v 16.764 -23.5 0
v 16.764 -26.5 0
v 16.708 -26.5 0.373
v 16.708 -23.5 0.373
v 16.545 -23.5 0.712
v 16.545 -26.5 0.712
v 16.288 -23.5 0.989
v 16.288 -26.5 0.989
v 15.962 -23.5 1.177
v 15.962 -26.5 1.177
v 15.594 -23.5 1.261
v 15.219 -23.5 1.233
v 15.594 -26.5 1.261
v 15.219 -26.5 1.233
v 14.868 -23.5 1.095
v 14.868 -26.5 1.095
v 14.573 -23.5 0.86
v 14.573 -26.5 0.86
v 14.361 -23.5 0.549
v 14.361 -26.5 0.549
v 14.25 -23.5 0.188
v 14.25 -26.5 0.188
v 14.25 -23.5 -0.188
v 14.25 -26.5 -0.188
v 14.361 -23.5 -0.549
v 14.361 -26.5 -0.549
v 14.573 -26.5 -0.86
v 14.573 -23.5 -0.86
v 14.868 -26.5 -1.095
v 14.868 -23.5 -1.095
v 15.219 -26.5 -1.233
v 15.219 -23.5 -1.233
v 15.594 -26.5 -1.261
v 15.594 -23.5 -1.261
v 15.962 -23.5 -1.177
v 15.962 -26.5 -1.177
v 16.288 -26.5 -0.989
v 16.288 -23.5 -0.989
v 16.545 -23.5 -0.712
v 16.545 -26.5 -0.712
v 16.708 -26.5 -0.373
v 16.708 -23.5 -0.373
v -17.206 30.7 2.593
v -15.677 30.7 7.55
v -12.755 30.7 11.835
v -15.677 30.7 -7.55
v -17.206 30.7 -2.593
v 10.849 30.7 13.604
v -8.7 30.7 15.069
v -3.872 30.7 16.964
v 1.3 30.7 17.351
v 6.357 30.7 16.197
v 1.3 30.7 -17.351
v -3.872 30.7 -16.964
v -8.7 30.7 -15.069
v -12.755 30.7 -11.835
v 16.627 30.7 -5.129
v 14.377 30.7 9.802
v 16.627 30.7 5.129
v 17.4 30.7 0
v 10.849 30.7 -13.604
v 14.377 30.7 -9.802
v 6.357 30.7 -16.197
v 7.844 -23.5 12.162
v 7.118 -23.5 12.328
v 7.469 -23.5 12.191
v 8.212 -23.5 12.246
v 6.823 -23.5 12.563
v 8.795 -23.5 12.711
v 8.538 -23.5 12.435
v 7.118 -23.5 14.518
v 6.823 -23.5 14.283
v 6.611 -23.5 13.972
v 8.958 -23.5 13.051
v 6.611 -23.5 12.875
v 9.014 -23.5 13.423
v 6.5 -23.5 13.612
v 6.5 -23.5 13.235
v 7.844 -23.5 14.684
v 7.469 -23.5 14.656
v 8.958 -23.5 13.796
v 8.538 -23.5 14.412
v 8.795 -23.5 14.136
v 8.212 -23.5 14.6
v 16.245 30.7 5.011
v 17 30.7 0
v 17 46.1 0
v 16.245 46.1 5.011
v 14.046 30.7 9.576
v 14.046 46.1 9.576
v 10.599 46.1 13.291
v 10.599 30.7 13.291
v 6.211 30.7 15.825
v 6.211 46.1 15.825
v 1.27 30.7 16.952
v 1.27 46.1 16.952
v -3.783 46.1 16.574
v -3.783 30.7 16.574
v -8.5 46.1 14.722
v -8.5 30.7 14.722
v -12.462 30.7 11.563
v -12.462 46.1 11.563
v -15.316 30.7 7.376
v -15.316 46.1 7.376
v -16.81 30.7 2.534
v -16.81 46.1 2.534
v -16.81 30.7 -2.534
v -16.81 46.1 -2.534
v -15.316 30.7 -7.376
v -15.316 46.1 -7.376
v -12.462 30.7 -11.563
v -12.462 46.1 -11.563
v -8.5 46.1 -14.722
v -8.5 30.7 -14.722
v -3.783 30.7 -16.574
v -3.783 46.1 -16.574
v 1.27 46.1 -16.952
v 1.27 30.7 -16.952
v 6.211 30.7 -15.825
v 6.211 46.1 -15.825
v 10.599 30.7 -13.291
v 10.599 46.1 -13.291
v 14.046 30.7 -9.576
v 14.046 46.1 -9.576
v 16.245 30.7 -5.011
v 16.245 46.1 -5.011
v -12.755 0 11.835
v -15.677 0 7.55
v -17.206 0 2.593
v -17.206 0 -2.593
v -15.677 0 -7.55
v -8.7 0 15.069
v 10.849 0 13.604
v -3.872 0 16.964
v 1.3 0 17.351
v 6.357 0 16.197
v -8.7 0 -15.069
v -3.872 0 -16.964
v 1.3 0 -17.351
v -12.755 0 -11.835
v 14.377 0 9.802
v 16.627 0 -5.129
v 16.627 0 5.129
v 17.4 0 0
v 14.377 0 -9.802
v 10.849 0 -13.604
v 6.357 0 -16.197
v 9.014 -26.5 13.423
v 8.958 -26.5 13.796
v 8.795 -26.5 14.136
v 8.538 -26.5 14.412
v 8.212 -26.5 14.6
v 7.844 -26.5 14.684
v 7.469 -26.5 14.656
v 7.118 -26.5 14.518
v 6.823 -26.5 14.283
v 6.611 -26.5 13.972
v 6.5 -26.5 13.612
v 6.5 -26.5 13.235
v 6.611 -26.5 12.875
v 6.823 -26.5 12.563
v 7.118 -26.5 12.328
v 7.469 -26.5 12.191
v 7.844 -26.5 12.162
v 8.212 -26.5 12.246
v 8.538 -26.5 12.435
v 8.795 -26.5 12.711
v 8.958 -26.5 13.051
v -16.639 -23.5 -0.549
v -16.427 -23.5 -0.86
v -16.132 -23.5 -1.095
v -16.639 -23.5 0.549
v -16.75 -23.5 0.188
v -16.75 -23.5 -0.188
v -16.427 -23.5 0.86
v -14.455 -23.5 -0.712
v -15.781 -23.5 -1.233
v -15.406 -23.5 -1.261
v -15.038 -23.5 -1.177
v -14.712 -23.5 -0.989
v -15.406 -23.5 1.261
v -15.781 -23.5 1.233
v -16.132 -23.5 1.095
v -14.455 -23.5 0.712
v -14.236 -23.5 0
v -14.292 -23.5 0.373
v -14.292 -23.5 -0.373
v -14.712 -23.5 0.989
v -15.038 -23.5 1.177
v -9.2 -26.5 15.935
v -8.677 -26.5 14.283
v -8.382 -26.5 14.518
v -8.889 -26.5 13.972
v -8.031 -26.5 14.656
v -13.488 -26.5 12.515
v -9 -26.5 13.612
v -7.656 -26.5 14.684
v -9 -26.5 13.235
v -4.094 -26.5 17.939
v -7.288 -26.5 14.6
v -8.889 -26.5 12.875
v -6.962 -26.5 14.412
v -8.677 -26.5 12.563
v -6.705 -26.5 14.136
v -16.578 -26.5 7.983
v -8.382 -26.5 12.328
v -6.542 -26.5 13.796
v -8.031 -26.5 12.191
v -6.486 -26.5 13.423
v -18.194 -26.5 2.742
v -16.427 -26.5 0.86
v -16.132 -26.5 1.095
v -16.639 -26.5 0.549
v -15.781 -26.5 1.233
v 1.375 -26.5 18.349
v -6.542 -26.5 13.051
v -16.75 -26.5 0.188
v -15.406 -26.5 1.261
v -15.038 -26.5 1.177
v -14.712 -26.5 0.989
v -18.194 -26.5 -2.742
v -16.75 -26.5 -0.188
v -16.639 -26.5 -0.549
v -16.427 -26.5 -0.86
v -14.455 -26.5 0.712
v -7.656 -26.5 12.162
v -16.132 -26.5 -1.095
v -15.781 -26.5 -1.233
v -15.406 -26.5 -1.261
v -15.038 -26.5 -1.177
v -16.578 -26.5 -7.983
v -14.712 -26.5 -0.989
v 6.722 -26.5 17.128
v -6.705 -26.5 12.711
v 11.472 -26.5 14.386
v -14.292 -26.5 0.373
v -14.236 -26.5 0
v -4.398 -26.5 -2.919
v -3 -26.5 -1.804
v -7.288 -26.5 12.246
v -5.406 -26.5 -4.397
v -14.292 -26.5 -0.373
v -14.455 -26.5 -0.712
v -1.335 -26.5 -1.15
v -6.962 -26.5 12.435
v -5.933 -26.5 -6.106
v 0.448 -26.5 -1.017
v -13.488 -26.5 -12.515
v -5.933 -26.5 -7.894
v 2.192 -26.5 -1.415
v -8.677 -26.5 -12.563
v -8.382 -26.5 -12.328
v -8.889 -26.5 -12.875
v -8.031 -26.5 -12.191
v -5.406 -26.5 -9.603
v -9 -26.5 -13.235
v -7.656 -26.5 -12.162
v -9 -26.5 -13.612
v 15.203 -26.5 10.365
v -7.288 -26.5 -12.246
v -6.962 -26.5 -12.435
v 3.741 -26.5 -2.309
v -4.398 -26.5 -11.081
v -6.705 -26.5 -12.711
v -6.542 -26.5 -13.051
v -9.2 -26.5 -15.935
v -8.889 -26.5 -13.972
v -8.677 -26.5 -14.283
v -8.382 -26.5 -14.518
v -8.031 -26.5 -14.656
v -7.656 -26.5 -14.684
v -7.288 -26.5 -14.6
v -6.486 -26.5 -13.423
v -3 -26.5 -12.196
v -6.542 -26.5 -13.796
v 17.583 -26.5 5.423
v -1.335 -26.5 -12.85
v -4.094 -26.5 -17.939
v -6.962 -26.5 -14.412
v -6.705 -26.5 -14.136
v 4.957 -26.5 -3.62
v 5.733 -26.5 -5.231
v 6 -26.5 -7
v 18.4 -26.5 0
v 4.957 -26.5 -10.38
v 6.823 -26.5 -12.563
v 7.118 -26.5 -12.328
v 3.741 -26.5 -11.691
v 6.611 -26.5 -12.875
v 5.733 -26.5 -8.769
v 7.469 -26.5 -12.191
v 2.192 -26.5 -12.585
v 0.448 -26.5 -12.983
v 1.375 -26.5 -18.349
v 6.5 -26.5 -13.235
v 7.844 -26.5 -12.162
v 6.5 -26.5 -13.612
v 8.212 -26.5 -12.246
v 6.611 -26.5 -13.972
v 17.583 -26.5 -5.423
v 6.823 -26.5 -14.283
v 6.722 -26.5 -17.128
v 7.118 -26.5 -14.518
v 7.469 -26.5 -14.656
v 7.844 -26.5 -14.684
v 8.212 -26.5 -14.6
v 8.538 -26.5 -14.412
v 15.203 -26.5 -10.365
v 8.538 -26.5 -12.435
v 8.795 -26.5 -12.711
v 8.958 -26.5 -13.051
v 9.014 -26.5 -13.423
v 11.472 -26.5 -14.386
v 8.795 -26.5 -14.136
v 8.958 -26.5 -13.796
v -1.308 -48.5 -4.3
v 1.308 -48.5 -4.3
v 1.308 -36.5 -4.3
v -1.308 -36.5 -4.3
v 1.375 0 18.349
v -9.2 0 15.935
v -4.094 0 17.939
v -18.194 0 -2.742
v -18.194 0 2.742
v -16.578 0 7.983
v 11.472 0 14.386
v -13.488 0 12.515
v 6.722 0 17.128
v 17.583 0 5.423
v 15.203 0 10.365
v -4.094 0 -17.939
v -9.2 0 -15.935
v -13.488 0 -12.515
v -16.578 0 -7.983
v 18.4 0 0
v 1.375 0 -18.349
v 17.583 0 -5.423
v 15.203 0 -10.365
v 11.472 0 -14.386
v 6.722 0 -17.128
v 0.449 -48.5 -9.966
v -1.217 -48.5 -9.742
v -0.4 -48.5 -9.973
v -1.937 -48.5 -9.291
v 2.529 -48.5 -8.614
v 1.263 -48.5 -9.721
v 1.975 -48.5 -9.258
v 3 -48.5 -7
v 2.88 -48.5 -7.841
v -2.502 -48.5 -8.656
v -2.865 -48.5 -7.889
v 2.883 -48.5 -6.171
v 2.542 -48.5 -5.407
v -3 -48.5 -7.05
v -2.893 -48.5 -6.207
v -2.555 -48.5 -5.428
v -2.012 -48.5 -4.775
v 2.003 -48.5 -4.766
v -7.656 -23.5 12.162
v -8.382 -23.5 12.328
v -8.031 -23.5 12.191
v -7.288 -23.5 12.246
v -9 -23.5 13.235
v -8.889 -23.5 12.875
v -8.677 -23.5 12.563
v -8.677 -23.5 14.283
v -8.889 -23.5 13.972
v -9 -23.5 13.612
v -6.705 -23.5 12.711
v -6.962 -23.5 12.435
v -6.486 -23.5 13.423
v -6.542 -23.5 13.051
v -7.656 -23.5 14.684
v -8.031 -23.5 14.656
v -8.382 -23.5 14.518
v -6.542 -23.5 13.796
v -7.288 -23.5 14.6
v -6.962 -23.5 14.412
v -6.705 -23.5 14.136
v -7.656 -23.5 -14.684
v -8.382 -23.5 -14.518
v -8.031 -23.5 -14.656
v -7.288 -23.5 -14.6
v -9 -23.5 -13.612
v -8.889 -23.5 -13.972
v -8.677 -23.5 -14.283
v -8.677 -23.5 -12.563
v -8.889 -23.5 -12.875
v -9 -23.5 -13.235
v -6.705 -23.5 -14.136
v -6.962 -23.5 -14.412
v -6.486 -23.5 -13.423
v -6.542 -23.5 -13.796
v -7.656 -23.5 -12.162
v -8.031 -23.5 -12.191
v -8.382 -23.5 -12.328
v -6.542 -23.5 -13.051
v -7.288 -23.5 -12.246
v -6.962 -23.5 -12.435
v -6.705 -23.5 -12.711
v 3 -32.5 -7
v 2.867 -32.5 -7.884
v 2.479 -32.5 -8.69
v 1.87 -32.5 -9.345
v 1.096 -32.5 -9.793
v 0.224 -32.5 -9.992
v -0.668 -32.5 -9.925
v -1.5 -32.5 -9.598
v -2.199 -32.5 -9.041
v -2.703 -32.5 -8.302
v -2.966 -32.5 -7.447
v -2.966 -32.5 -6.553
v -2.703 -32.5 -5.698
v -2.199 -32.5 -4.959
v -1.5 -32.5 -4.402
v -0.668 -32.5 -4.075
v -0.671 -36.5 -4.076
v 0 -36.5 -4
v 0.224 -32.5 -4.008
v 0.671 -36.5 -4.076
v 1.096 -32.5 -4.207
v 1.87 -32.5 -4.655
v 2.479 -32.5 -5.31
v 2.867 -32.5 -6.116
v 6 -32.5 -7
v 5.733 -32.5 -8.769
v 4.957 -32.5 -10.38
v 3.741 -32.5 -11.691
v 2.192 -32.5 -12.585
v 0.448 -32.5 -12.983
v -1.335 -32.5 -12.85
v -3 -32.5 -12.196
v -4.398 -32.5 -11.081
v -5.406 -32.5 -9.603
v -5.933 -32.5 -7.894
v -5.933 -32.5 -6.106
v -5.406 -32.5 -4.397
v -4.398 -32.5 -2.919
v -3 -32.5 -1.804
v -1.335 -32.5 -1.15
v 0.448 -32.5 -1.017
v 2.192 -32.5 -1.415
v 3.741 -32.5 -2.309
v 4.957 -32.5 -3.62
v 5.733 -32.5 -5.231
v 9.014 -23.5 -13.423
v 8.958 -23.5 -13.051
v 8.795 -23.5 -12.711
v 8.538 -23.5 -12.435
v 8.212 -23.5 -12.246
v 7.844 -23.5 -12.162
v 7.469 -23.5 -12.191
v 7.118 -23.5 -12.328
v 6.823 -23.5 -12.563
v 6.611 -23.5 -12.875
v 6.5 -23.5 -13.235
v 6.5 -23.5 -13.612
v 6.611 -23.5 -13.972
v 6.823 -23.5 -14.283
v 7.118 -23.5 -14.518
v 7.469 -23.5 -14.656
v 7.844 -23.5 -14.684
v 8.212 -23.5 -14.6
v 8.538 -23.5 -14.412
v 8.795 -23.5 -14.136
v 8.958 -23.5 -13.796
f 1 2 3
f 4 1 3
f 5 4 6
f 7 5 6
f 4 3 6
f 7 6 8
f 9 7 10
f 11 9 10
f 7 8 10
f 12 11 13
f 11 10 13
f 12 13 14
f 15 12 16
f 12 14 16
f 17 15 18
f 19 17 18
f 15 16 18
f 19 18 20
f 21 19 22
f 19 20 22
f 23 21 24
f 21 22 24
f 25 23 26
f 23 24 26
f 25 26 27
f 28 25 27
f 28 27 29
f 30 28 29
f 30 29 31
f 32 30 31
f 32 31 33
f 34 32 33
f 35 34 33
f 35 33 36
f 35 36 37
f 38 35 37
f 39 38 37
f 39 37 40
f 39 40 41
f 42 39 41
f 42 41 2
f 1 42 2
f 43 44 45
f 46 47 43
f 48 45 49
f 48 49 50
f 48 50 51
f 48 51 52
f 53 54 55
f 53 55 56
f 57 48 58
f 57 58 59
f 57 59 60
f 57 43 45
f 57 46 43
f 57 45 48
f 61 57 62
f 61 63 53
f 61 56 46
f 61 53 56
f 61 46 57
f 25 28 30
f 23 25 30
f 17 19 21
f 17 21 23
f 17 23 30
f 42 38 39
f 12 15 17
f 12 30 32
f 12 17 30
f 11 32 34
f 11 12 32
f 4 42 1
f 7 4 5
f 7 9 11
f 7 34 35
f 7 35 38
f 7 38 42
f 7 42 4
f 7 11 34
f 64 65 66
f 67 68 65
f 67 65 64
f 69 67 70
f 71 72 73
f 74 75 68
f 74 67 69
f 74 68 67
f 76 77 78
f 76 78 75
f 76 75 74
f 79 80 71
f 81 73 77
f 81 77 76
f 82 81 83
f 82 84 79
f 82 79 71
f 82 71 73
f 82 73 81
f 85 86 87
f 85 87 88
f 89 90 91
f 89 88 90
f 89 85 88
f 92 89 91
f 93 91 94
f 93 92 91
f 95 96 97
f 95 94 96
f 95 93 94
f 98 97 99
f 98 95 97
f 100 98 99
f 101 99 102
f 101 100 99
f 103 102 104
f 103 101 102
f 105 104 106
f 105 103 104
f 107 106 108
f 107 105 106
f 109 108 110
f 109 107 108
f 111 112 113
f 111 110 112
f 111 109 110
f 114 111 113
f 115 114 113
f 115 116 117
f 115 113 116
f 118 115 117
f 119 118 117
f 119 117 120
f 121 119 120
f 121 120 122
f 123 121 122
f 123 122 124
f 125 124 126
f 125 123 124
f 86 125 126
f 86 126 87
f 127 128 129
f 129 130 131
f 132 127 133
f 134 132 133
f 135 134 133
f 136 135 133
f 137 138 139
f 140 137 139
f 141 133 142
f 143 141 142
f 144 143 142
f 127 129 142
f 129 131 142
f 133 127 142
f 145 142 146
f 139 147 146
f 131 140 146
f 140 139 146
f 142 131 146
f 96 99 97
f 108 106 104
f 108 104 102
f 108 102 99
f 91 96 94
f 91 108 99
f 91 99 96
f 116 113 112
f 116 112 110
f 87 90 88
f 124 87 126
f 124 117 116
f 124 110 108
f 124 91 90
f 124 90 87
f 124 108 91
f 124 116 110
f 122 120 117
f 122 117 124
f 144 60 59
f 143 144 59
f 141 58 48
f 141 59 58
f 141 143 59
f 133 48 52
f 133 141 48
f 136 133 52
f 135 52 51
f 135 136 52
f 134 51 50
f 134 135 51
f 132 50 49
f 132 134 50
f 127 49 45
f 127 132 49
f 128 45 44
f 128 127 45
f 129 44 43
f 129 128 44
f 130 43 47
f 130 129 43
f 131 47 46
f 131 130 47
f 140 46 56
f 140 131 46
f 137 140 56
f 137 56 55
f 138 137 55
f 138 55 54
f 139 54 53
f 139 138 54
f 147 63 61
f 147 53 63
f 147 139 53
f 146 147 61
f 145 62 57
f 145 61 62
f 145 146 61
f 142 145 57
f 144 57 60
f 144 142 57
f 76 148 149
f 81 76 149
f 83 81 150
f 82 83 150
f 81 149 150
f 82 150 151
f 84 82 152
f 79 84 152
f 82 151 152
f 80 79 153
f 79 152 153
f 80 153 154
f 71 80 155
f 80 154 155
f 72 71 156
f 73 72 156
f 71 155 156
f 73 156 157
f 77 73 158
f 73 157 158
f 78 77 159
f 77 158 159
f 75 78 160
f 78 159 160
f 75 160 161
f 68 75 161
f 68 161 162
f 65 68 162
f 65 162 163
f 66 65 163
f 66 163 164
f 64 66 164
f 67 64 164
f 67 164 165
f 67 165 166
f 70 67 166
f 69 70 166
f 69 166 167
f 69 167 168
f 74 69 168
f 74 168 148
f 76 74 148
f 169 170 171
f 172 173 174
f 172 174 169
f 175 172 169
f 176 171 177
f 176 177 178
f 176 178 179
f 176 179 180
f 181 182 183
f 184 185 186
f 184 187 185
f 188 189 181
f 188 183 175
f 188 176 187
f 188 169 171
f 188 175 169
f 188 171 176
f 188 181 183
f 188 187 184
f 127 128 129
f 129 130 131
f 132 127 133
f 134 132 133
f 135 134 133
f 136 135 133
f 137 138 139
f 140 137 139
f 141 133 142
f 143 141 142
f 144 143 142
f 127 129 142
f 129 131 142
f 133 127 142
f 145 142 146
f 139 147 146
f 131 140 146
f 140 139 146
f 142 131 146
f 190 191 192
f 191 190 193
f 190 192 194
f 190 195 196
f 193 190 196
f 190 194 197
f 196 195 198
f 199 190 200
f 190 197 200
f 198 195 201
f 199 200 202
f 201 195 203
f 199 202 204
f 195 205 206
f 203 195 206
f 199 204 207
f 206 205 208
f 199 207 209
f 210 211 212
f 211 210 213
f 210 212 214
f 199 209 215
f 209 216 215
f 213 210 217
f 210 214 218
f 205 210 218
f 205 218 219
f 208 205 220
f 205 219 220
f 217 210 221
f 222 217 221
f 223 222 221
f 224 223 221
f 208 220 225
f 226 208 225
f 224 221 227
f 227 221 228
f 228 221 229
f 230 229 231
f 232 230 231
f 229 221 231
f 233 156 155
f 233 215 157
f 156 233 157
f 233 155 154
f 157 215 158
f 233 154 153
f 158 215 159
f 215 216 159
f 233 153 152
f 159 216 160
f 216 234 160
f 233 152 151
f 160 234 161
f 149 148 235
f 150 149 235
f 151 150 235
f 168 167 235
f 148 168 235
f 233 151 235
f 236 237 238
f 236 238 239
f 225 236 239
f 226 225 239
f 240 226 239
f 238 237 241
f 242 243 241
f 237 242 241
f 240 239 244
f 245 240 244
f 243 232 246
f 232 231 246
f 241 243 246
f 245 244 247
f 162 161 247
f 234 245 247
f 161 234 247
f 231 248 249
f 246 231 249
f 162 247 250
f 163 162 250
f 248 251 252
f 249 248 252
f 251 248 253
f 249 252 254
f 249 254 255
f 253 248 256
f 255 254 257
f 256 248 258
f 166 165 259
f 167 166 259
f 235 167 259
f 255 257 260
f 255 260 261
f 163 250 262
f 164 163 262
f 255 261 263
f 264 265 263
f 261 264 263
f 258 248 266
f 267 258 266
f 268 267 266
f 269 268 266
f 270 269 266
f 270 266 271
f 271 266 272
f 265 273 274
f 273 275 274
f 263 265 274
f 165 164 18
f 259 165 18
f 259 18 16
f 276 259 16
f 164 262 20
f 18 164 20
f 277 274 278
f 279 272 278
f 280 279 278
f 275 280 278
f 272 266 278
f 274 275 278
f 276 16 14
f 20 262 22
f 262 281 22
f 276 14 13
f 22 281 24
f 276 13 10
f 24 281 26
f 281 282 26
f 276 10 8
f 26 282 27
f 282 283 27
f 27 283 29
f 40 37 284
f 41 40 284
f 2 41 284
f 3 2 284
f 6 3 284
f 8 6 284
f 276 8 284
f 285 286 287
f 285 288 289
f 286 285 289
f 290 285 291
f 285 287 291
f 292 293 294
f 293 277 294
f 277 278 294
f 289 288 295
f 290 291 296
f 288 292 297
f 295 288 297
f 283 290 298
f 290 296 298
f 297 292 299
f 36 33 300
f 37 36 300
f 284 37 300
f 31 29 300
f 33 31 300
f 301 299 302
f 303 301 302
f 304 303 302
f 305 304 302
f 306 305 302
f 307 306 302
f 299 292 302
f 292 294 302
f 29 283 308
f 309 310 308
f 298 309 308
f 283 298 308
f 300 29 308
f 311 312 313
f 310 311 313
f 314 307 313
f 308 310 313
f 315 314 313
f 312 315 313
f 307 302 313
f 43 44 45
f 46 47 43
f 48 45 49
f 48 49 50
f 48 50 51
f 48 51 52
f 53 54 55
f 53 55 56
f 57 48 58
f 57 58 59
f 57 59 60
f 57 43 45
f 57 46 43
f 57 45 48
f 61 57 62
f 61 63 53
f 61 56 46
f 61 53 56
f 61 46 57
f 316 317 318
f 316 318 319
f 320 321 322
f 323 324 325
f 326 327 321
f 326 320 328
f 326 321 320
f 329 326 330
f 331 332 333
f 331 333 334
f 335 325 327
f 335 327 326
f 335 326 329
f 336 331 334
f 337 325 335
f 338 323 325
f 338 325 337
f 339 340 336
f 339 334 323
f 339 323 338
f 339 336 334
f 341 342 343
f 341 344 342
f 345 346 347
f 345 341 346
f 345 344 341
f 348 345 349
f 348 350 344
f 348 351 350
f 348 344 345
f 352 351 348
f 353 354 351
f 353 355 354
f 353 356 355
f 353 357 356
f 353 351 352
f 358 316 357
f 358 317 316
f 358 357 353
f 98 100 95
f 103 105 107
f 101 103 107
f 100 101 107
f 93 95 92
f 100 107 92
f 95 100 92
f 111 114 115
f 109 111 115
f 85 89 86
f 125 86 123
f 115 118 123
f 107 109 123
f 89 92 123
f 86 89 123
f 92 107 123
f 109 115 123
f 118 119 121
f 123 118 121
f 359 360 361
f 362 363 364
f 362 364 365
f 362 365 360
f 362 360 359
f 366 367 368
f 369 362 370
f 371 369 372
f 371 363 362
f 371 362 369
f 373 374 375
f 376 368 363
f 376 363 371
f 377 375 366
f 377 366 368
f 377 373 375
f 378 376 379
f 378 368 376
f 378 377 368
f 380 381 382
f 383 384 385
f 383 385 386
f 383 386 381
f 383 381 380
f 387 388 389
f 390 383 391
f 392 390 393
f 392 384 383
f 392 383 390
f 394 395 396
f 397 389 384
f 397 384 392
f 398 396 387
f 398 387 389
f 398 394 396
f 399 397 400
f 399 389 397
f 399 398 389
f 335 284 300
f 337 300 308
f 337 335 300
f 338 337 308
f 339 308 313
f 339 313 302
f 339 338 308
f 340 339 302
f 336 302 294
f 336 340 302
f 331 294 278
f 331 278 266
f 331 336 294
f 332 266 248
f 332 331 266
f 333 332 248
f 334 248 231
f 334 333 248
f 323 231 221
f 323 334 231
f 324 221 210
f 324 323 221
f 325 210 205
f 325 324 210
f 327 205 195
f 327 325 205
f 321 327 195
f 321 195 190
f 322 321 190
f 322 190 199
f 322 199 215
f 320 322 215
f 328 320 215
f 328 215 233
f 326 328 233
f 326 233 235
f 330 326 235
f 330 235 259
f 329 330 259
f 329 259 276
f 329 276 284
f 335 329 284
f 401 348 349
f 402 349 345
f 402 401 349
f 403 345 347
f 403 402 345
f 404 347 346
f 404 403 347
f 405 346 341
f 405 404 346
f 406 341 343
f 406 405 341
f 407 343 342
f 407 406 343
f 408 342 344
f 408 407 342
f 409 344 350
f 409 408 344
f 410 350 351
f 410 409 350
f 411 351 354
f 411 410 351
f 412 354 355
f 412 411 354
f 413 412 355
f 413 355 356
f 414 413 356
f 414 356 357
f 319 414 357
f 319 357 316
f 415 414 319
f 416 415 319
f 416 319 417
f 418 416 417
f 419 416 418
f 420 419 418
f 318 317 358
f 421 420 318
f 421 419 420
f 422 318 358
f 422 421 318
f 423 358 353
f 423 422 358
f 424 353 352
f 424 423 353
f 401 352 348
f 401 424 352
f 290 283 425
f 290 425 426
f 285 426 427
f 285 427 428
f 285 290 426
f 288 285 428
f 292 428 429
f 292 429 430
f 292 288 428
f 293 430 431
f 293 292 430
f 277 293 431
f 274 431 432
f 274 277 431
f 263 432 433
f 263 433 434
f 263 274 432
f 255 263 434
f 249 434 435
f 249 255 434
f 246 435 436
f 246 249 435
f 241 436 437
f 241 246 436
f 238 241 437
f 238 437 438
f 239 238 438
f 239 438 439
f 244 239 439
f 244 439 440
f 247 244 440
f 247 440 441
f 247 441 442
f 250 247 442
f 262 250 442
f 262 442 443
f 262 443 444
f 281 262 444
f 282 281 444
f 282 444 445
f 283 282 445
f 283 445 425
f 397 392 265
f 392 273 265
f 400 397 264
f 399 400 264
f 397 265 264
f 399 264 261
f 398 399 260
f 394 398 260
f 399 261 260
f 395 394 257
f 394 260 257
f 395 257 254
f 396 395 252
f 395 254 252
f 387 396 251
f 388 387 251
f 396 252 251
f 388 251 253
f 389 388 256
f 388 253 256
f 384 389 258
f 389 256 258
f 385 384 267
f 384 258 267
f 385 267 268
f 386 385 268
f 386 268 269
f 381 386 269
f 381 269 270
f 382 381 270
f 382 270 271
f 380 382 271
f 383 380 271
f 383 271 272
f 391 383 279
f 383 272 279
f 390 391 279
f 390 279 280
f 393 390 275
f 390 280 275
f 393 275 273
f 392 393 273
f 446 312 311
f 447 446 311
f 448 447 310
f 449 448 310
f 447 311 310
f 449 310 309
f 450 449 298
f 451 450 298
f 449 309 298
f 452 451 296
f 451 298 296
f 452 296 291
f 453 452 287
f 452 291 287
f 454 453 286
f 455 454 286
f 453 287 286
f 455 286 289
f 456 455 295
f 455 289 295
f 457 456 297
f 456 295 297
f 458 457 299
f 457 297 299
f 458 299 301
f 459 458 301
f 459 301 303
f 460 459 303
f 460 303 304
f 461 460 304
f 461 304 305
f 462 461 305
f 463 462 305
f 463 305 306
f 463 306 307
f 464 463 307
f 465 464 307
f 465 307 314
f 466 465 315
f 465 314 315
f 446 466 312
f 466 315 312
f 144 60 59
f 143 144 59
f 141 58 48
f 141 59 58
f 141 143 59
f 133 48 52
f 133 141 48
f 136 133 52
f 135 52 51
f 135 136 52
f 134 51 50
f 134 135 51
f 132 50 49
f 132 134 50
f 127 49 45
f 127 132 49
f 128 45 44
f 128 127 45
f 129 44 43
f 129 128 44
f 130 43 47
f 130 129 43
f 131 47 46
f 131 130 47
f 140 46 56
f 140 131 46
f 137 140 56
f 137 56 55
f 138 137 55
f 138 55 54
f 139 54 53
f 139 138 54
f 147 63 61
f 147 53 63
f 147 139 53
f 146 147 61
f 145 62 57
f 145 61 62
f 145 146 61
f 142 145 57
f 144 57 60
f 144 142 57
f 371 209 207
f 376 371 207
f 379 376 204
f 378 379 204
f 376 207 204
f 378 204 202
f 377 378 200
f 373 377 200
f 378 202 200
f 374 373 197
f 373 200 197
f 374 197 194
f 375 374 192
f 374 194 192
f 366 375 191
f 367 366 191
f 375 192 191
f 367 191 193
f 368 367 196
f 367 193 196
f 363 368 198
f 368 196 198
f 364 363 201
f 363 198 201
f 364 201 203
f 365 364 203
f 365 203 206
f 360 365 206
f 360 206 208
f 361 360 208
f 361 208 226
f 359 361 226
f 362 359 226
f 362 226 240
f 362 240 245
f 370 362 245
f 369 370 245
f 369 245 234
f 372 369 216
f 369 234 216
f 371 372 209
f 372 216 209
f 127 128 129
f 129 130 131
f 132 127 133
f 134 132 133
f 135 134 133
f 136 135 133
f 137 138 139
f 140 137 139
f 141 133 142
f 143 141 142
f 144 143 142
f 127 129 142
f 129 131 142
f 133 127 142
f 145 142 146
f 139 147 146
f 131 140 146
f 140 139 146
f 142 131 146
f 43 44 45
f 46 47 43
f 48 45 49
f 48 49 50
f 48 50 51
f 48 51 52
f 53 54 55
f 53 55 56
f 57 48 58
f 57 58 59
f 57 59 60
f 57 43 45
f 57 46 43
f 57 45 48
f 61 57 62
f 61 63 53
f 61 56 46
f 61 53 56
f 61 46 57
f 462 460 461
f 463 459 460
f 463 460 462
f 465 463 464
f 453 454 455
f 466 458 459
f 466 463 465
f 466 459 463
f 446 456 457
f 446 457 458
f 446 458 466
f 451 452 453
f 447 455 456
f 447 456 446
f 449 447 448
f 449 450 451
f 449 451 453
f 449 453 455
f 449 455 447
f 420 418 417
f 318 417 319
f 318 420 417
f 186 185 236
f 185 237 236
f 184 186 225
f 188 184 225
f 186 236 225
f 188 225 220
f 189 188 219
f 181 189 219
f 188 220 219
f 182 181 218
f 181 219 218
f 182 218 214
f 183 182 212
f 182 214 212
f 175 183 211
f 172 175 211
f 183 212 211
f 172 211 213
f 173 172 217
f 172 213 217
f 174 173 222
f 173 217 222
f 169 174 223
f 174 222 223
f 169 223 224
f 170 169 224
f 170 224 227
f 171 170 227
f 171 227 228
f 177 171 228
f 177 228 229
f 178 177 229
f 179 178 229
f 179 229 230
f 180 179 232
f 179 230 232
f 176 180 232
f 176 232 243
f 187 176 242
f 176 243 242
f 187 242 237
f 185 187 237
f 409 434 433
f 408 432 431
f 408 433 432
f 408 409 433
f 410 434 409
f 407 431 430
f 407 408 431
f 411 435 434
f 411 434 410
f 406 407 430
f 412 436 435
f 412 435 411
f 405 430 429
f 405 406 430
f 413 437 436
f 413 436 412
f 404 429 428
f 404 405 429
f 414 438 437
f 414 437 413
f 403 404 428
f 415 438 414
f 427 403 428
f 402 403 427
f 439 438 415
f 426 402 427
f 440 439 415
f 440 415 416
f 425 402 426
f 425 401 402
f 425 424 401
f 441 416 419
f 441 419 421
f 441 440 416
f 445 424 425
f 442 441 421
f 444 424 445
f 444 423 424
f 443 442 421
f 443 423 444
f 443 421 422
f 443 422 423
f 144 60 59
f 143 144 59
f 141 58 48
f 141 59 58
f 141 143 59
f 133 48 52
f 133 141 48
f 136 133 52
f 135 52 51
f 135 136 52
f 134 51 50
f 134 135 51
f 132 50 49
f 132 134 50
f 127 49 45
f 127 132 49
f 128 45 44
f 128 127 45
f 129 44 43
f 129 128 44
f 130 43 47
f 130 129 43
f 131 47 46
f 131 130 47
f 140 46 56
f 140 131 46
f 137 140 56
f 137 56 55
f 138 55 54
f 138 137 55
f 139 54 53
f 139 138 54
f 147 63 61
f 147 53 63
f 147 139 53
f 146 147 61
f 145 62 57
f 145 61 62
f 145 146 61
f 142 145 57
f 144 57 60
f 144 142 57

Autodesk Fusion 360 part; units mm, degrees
sketch "Skizze1" plane through (0, 0, 0) normal (0, 1, 0) x (1, 0, 0)
  circle A0 centre (0, 0) radius 17.4
  dimension "d1" = 34.8
  dimension "d62" = 0
  dimension "d63" = 0
  dimension "d64" = 0
  dimension "d65" = 0
  dimension "d74" = 0
  dimension "d75" = 0
  dimension "d76" = 0
  dimension "d77" = 0
  dimension "d86" = 0
  dimension "d87" = 0
  dimension "d88" = 0
  dimension "d89" = 0
extrude "Extrusion3" add sketch "Skizze1" along normal blind 30.7 makes body 1
extrude "Extrusion2" add sketch "Skizze1" along normal blind 30.7 separate body makes body 2
extrude "Extrusion1" add sketch "Skizze1" along normal blind 30.7 separate body makes body 3
copy_body "Körper->Berechn1" bodies 1 removing the originals makes body 4 in component "Motor"
ref_plane "Arbeitsebene1" through (0, 0, 0) normal (0, 1, 0) x (1, 0, 0) in component "Gearbox"
sketch "Skizze1 (2)" plane through (0, 0, 0) normal (0, 1, 0) x (1, 0, 0) in component "Gearbox"
  circle A0 centre (0, 0) radius 18.4
  dimension "d13" = 36.8
extrude "Extrusion1'" add sketch "Skizze1 (2)" against normal blind 26.5 separate body makes body 5 in component "Gearbox"
ref_plane "Arbeitsebene1" through (0, 30.7, 0) normal (0, 1, 0) x (1, 0, 0) in component "Encoder"
sketch "Skizze1 (3)" plane through (0, 30.7, 0) normal (0, 1, 0) x (1, 0, 0) in component "Encoder"
  circle A0 centre (0, 0) radius 17
  dimension "d17" = 34
extrude "Extrusion1''" add sketch "Skizze1 (3)" along normal blind 15.4 separate body makes body 6 in component "Encoder"
sketch "Skizze3" plane through (0, -26.5, 0) normal (0, -1, 0) x (1, 0, 0)
  circle A0 centre (0, 0) radius 18.4
  circle A1 centre (0, 0) radius 15.5 construction
  circle A2 centre (0, -7) radius 6
  line L0 (0, 0) -> (0, -28) construction
  dimension "d20" = 31
  dimension "d21" = 12
  dimension "d22" = 7
extrude "Extrusion2'" add sketch "Skizze3" along normal blind 6 contours A2 bodies 5 in component "Gearbox"
sketch "Skizze4" plane through (0, -32.5, 0) normal (0, -1, 0) x (1, 0, 0)
  circle A0 centre (0, -7) radius 6
  circle A1 centre (0, -7) radius 3
  dimension "d25" = 6
extrude "Extrusion3'" add sketch "Skizze4" along normal blind 16 contours A1 bodies 5 in component "Gearbox"
sketch "Skizze2" plane through (0, -26.5, 0) normal (0, -1, 0) x (1, 0, 0) in component "Gearbox"
  circle A0 centre (0, -7) radius 6
  circle A1 centre (0, 0) radius 18.4
  circle A2 centre (0, 0) radius 15.5 construction
  circle A3 centre (-15.5, 0) radius 1.6
  circle A4 centre (-7.75, -13.4234) radius 1.6
  circle A5 centre (7.75, -13.4234) radius 1.6
  circle A6 centre (15.5, 0) radius 1.6
  circle A7 centre (7.75, 13.4234) radius 1.6
  circle A8 centre (-7.75, 13.4234) radius 1.6
  dimension "d28" = 31
  dimension "d29" = 3.2
  dimension "d31" = 360
extrude "Extrusion4" cut sketch "Skizze2" against normal blind 3 contours A3 | A4 | A5 | A6 | A7 | A8 bodies 5 in component "Gearbox"
thread "Gewinde1" "ISO Metric profile 3.0 M3x0.5 6H" major diameter 3.086 minor diameter 2.529 pitch 0.5 angle 60 resizes the face on face at (-6.152, -24.5, 13.3436) on bodies 5 in component "Gearbox"
thread "Gewinde2" "ISO Metric profile 3.0 M3x0.5 6H" major diameter 3.086 minor diameter 2.529 pitch 0.5 angle 60 resizes the face on face at (9.348, -24.5, 13.3436) on bodies 5 in component "Gearbox"
thread "Gewinde3" "ISO Metric profile 3.0 M3x0.5 6H" major diameter 3.086 minor diameter 2.529 pitch 0.5 angle 60 resizes the face on face at (17.098, -24.5, -0.0798) on bodies 5 in component "Gearbox"
thread "Gewinde4" "ISO Metric profile 3.0 M3x0.5 6H" major diameter 3.086 minor diameter 2.529 pitch 0.5 angle 60 resizes the face on face at (-13.902, -24.5, -0.0798) on bodies 5 in component "Gearbox"
thread "Gewinde5" "ISO Metric profile 3.0 M3x0.5 6H" major diameter 3.086 minor diameter 2.529 pitch 0.5 angle 60 resizes the face on face at (-6.152, -24.5, -13.5031) on bodies 5 in component "Gearbox"
thread "Gewinde6" "ISO Metric profile 3.0 M3x0.5 6H" major diameter 3.086 minor diameter 2.529 pitch 0.5 angle 60 resizes the face on face at (9.348, -24.5, -13.5031) on bodies 5 in component "Gearbox"
sketch "Skizze5" plane through (0, -48.5, 0) normal (0, -1, 0) x (1, 0, 0)
  circle A0 centre (0, -7) radius 3
  line L0 (-3, -2.3) -> (3, -2.3)
  line L1 (3, -2.3) -> (3, -4.3)
  line L2 (3, -4.3) -> (-3, -4.3)
  line L3 (-3, -4.3) -> (-3, -2.3)
  dimension "d130" = 2.7
extrude "Extrusion5" cut sketch "Skizze5" against normal blind 12 contours A0 L2 | A0 L0 L1 L2 L3 picked at (-0.0644, -4.105) bodies 5 in component "Gearbox"
component "Motor" placed x (1, 0, 0) y (0, 1, 0) z (0, 0, 1) at (0, 0, 0)
component "Gearbox" placed x (1, 0, 0) y (0, 1, 0) z (0, 0, 1) at (0, 0, 0)
component "Encoder" placed x (1, 0, 0) y (0, 1, 0) z (0, 0, 1) at (0, 0, 0)
